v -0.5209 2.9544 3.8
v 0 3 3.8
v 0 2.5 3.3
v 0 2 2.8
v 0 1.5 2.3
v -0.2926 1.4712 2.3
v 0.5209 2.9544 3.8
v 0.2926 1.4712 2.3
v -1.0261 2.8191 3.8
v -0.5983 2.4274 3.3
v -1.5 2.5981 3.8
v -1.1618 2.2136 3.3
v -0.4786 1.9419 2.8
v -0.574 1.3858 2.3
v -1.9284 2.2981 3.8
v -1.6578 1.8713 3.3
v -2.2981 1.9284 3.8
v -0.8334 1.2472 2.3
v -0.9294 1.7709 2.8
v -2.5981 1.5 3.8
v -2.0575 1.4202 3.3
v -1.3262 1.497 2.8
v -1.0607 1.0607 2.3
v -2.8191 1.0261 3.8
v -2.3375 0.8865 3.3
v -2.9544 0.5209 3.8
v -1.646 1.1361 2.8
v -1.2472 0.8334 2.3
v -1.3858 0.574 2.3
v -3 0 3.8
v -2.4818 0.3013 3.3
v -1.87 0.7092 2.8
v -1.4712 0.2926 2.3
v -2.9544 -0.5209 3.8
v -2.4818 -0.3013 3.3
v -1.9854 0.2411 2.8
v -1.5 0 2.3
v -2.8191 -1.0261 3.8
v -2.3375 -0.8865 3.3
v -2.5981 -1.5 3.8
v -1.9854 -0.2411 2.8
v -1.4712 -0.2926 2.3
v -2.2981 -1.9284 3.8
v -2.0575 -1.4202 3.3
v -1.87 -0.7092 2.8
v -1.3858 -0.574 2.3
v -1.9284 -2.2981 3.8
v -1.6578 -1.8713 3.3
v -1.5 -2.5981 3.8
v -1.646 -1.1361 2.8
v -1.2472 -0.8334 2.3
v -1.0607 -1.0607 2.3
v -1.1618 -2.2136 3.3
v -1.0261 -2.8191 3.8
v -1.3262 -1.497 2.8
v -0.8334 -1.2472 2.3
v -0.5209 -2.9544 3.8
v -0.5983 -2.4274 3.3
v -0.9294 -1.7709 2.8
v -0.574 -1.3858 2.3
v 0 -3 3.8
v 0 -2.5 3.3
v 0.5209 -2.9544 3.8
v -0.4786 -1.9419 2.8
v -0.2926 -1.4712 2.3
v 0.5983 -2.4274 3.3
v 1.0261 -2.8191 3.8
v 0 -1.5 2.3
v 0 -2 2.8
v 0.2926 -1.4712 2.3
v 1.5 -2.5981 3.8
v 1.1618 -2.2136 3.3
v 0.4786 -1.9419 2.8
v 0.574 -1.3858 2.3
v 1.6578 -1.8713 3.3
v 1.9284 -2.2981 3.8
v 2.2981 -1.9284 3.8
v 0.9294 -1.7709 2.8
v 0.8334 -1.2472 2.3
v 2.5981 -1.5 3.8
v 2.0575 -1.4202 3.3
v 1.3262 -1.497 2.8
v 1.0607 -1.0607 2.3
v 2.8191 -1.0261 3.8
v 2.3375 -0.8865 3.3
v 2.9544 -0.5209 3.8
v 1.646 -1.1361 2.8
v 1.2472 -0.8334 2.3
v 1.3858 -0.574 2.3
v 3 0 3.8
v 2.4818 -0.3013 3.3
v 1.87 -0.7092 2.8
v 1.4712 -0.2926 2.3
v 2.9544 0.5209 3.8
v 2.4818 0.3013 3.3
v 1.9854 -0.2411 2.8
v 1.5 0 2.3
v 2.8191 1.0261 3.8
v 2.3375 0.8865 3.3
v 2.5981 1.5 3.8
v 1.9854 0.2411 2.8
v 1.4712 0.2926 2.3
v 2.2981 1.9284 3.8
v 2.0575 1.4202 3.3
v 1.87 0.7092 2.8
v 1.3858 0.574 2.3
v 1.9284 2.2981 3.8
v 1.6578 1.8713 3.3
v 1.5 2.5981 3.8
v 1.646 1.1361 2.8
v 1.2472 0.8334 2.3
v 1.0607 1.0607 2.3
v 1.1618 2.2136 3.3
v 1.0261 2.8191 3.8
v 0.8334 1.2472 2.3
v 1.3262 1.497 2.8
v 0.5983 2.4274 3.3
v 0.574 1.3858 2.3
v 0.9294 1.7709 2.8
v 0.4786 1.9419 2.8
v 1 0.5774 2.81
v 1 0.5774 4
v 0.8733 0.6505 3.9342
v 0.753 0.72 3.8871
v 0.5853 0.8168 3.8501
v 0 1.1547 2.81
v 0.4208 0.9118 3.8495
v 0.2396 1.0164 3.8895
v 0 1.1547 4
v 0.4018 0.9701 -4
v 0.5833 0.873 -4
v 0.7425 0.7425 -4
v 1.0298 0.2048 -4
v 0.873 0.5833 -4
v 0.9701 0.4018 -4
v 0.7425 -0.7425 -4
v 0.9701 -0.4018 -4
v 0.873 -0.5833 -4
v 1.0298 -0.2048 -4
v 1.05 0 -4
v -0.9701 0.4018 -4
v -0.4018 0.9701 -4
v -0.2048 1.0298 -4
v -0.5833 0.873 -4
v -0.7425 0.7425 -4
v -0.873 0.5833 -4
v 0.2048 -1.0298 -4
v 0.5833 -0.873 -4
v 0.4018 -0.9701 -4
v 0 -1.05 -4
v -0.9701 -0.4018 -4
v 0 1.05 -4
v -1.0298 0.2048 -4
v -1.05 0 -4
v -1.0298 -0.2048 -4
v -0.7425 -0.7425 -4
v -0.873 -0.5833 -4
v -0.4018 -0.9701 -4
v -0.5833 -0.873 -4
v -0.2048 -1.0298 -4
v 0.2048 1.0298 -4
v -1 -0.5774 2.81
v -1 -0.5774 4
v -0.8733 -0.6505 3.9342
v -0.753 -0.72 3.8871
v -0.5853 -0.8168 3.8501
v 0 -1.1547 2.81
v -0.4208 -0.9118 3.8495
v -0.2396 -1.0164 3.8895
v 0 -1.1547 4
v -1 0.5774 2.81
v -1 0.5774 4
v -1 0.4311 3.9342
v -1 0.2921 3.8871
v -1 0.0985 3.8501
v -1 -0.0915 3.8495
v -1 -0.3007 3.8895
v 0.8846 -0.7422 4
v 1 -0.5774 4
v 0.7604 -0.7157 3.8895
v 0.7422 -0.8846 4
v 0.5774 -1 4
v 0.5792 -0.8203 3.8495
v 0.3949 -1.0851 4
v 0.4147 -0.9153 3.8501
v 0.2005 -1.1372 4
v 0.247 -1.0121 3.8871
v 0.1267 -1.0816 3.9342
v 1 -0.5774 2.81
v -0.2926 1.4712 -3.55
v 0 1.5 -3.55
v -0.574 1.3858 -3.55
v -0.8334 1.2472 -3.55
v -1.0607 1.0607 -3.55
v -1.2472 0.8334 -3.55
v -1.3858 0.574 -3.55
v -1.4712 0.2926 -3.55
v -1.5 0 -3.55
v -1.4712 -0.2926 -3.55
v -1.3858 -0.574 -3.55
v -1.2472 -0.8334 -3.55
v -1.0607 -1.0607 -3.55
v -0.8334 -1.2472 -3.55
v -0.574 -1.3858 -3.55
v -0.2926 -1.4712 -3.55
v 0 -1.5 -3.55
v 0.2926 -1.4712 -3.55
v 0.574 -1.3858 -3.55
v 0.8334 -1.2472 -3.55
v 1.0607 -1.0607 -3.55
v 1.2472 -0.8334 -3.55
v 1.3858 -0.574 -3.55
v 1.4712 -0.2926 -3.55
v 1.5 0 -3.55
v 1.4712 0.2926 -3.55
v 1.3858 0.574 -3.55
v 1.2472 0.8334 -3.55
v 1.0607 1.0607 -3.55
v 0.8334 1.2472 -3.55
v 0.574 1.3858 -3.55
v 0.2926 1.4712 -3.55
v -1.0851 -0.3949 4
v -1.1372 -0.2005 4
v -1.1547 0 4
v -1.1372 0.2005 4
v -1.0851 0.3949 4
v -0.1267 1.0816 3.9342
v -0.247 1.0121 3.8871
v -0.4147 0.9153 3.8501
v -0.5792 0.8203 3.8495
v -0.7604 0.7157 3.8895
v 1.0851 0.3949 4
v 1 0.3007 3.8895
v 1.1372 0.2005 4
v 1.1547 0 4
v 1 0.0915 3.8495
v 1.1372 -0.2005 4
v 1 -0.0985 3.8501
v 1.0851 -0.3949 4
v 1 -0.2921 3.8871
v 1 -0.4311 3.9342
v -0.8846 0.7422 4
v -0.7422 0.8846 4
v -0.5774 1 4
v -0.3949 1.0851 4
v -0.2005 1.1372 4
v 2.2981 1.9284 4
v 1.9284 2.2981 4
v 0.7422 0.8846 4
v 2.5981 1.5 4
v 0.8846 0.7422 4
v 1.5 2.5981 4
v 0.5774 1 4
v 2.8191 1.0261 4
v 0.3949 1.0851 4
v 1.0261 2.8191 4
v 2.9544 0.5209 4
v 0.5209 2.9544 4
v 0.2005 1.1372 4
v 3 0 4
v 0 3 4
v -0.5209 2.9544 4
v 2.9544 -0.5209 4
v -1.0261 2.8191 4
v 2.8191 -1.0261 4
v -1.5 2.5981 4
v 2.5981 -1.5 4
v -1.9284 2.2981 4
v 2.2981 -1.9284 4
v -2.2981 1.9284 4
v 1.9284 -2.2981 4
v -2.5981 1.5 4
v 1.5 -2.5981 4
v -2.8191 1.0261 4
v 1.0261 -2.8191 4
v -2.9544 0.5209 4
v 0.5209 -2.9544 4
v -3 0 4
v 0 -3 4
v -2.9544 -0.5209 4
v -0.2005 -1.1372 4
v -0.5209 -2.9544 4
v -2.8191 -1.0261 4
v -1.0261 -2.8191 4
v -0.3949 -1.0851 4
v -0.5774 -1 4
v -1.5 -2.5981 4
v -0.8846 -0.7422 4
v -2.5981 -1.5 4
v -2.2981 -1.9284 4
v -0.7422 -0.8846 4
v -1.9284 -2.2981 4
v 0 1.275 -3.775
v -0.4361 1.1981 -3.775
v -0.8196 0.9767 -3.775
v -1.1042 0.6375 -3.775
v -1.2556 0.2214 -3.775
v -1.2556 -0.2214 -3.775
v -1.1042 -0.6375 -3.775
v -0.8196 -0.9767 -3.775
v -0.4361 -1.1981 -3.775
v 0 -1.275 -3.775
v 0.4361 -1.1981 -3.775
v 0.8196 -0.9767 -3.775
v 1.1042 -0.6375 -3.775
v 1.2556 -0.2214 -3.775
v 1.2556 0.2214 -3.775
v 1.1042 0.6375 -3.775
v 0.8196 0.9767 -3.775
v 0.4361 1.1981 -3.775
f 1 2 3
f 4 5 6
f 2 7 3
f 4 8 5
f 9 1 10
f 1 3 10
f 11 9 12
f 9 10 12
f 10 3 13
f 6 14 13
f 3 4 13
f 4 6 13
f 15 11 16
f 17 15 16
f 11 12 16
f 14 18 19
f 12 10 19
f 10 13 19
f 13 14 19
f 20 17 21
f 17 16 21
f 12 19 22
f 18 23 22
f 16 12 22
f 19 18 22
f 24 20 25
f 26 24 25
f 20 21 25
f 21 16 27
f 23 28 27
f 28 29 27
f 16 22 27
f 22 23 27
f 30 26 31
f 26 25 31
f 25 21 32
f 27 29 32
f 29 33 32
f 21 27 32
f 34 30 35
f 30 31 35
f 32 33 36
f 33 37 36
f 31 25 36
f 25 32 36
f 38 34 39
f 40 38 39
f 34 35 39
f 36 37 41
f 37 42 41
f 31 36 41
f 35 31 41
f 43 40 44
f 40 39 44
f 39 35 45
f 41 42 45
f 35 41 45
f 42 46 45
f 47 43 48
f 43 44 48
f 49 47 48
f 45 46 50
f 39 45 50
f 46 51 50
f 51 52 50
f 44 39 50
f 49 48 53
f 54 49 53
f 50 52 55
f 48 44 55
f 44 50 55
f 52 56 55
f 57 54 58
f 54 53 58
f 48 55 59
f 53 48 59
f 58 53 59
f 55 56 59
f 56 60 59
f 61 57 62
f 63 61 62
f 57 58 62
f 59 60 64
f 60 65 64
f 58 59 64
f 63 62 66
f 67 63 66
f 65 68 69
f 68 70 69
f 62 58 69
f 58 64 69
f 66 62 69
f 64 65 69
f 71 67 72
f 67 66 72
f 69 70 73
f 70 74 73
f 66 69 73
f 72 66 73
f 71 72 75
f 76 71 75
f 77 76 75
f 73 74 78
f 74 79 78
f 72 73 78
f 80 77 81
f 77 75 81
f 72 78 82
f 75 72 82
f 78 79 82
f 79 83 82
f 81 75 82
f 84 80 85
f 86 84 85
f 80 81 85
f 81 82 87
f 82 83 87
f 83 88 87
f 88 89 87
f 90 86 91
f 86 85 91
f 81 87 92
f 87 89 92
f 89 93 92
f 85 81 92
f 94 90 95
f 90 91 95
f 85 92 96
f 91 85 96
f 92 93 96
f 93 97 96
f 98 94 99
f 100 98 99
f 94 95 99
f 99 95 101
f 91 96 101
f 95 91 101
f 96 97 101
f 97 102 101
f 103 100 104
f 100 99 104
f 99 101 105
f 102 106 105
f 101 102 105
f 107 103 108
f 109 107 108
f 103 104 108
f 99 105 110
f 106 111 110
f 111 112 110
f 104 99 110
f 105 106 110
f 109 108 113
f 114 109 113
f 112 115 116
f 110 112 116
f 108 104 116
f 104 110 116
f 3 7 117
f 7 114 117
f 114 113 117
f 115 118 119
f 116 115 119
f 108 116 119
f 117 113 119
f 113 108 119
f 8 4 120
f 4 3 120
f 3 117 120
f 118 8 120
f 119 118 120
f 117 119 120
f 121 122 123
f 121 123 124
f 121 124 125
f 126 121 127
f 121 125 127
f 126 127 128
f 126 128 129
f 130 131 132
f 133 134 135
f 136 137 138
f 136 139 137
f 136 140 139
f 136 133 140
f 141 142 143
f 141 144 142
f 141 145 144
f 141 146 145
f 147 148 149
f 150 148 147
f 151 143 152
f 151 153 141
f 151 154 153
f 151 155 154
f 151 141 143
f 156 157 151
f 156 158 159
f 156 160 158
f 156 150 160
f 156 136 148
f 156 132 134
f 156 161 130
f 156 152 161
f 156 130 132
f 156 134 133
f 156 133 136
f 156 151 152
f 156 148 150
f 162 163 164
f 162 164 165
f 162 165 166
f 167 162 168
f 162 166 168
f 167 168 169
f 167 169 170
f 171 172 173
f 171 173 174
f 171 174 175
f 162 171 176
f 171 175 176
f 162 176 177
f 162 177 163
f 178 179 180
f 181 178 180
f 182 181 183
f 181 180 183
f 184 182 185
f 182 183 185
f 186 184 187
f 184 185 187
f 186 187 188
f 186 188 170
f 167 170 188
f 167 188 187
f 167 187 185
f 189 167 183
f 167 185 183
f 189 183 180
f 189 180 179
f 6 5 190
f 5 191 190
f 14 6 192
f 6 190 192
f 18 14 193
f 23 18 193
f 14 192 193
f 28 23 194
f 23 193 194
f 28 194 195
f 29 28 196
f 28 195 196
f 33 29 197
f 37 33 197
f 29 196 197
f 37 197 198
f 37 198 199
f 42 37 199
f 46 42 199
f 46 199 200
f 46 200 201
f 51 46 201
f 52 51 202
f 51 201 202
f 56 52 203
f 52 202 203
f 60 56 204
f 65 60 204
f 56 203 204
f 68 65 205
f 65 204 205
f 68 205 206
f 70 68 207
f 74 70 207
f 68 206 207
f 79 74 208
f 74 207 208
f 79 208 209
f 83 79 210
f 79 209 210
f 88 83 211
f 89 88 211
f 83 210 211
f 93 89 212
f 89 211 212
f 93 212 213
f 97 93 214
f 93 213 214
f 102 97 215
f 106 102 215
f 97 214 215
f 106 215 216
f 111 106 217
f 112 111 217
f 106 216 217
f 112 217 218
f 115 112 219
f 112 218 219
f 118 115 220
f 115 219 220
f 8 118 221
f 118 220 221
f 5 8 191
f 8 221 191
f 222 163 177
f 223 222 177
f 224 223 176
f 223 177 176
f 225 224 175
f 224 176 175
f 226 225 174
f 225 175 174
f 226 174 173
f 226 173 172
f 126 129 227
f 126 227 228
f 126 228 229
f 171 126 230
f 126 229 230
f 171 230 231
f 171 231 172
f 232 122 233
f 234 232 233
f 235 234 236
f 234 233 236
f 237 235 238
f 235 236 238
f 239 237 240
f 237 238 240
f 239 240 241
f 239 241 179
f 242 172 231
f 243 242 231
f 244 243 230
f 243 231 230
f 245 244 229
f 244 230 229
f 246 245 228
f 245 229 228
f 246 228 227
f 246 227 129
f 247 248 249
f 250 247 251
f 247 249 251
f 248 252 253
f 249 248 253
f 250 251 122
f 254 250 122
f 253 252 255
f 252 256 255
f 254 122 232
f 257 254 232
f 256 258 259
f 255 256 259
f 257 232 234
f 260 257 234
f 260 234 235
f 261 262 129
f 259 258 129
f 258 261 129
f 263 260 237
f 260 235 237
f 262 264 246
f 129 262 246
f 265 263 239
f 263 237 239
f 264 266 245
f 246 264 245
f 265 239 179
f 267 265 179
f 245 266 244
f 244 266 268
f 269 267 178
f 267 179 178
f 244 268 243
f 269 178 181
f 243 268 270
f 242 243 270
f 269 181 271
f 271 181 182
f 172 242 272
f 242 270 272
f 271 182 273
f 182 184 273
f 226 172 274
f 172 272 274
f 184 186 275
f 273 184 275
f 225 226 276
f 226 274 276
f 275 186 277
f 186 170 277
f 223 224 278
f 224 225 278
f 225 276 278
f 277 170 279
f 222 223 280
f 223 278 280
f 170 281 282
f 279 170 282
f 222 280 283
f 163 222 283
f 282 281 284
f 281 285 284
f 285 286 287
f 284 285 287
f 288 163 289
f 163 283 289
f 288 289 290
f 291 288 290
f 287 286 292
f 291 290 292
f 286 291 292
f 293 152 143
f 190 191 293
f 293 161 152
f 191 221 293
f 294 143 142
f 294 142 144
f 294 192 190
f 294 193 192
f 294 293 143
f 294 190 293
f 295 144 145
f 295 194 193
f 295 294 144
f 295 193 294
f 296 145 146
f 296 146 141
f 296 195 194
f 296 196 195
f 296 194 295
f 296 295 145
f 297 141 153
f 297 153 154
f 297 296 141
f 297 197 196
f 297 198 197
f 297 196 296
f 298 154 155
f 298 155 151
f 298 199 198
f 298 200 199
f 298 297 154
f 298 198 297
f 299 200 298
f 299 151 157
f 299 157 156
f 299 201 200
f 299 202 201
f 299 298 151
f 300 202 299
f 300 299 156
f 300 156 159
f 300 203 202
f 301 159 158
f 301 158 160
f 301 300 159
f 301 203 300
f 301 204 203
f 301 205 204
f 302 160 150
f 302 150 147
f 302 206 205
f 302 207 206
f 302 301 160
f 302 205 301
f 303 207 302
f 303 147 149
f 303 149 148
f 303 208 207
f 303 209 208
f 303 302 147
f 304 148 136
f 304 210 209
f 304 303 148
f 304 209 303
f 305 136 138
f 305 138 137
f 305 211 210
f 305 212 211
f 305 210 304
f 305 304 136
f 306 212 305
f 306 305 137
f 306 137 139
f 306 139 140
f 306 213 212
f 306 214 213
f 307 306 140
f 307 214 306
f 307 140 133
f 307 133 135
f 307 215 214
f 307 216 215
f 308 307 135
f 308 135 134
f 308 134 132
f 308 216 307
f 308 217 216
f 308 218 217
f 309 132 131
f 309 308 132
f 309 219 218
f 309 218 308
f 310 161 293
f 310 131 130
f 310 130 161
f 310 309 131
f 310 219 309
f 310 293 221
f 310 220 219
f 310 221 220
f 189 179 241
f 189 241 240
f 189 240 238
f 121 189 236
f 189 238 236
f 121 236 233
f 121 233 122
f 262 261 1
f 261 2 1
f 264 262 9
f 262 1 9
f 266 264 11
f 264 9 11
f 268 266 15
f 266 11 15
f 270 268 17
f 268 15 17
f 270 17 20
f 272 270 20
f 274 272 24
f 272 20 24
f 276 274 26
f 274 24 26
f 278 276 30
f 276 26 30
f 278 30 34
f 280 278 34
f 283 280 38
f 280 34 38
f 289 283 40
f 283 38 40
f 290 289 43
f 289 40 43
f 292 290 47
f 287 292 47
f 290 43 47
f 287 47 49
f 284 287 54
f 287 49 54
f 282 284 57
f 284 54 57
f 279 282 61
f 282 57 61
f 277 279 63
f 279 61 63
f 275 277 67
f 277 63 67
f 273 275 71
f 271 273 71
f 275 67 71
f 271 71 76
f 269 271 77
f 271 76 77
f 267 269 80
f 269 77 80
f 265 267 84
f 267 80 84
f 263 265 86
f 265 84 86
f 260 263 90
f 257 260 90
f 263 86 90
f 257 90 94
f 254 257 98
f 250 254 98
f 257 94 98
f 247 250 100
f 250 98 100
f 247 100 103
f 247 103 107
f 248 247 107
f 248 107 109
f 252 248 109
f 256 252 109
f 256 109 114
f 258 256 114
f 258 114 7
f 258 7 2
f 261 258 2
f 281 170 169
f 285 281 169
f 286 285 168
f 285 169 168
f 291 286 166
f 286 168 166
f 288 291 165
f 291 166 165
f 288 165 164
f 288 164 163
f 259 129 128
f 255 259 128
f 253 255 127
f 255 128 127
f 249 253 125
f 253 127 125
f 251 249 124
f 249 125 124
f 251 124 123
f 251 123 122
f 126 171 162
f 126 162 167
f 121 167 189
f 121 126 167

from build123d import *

# Parameters (mm, degrees)
SKETCH3_W          = 8
SKETCH3_H          = 1.5
CHAMFER1_SIZE      = 0.45
CUT_EXTRUDE1_DEPTH = 1.19


with BuildPart() as part:
    # Sketch3 → Revolve1 (revolve)
    with BuildSketch(Plane(origin=(0, 0, 0), x_dir=(0, 0, -1), z_dir=(1, 0, 0))):
        with Locations((0, 0.75)):
            Rectangle(SKETCH3_W, SKETCH3_H)
    revolve(axis=Axis((0, 0, -4), (0, 0, 1)))

    # Chamfer1
    chamfer1_edges = [part.edges().sort_by_distance(p)[0] for p in [
        (0, -1.5, -4),
    ]]
    chamfer(chamfer1_edges, length=CHAMFER1_SIZE)

    # Sketch6 → Revolve2 (revolve)
    with BuildSketch(Plane(origin=(0, 0, 0), x_dir=(0, 0, -1), z_dir=(1, 0, 0))):
        Polygon((-4, 3), (-3.8, 3), (-2.3, 1.5), (-2.3, 0), (-4, 0), align=None)
    revolve(axis=Axis((0, 0, -4), (0, 0, 1)))

    # Sketch8 → Cut-Extrude1 (cut)
    with BuildSketch(Plane.XY.offset(4)):
        Polygon((0, 1.154700538), (-1, 0.577350269), (-1, -0.577350269), (0, -1.154700538), (1, -0.577350269), (1, 0.577350269), align=None)
    extrude(amount=-CUT_EXTRUDE1_DEPTH, mode=Mode.SUBTRACT)

    # Cut-Extrude2 cone 1 section (through the dimple's axis) → Cut-Extrude2 (revolve, cut)
    with BuildSketch(Plane(origin=(0, 0, 4), x_dir=(0, -1, 0), z_dir=(1, 0, 0))):
        Polygon((0, 0), (1.154700538, 0), (0, 1.154700538), align=None)
    revolve(axis=Axis((0, 0, 4), (0, 0, -1)), mode=Mode.SUBTRACT)


solid = part.part
